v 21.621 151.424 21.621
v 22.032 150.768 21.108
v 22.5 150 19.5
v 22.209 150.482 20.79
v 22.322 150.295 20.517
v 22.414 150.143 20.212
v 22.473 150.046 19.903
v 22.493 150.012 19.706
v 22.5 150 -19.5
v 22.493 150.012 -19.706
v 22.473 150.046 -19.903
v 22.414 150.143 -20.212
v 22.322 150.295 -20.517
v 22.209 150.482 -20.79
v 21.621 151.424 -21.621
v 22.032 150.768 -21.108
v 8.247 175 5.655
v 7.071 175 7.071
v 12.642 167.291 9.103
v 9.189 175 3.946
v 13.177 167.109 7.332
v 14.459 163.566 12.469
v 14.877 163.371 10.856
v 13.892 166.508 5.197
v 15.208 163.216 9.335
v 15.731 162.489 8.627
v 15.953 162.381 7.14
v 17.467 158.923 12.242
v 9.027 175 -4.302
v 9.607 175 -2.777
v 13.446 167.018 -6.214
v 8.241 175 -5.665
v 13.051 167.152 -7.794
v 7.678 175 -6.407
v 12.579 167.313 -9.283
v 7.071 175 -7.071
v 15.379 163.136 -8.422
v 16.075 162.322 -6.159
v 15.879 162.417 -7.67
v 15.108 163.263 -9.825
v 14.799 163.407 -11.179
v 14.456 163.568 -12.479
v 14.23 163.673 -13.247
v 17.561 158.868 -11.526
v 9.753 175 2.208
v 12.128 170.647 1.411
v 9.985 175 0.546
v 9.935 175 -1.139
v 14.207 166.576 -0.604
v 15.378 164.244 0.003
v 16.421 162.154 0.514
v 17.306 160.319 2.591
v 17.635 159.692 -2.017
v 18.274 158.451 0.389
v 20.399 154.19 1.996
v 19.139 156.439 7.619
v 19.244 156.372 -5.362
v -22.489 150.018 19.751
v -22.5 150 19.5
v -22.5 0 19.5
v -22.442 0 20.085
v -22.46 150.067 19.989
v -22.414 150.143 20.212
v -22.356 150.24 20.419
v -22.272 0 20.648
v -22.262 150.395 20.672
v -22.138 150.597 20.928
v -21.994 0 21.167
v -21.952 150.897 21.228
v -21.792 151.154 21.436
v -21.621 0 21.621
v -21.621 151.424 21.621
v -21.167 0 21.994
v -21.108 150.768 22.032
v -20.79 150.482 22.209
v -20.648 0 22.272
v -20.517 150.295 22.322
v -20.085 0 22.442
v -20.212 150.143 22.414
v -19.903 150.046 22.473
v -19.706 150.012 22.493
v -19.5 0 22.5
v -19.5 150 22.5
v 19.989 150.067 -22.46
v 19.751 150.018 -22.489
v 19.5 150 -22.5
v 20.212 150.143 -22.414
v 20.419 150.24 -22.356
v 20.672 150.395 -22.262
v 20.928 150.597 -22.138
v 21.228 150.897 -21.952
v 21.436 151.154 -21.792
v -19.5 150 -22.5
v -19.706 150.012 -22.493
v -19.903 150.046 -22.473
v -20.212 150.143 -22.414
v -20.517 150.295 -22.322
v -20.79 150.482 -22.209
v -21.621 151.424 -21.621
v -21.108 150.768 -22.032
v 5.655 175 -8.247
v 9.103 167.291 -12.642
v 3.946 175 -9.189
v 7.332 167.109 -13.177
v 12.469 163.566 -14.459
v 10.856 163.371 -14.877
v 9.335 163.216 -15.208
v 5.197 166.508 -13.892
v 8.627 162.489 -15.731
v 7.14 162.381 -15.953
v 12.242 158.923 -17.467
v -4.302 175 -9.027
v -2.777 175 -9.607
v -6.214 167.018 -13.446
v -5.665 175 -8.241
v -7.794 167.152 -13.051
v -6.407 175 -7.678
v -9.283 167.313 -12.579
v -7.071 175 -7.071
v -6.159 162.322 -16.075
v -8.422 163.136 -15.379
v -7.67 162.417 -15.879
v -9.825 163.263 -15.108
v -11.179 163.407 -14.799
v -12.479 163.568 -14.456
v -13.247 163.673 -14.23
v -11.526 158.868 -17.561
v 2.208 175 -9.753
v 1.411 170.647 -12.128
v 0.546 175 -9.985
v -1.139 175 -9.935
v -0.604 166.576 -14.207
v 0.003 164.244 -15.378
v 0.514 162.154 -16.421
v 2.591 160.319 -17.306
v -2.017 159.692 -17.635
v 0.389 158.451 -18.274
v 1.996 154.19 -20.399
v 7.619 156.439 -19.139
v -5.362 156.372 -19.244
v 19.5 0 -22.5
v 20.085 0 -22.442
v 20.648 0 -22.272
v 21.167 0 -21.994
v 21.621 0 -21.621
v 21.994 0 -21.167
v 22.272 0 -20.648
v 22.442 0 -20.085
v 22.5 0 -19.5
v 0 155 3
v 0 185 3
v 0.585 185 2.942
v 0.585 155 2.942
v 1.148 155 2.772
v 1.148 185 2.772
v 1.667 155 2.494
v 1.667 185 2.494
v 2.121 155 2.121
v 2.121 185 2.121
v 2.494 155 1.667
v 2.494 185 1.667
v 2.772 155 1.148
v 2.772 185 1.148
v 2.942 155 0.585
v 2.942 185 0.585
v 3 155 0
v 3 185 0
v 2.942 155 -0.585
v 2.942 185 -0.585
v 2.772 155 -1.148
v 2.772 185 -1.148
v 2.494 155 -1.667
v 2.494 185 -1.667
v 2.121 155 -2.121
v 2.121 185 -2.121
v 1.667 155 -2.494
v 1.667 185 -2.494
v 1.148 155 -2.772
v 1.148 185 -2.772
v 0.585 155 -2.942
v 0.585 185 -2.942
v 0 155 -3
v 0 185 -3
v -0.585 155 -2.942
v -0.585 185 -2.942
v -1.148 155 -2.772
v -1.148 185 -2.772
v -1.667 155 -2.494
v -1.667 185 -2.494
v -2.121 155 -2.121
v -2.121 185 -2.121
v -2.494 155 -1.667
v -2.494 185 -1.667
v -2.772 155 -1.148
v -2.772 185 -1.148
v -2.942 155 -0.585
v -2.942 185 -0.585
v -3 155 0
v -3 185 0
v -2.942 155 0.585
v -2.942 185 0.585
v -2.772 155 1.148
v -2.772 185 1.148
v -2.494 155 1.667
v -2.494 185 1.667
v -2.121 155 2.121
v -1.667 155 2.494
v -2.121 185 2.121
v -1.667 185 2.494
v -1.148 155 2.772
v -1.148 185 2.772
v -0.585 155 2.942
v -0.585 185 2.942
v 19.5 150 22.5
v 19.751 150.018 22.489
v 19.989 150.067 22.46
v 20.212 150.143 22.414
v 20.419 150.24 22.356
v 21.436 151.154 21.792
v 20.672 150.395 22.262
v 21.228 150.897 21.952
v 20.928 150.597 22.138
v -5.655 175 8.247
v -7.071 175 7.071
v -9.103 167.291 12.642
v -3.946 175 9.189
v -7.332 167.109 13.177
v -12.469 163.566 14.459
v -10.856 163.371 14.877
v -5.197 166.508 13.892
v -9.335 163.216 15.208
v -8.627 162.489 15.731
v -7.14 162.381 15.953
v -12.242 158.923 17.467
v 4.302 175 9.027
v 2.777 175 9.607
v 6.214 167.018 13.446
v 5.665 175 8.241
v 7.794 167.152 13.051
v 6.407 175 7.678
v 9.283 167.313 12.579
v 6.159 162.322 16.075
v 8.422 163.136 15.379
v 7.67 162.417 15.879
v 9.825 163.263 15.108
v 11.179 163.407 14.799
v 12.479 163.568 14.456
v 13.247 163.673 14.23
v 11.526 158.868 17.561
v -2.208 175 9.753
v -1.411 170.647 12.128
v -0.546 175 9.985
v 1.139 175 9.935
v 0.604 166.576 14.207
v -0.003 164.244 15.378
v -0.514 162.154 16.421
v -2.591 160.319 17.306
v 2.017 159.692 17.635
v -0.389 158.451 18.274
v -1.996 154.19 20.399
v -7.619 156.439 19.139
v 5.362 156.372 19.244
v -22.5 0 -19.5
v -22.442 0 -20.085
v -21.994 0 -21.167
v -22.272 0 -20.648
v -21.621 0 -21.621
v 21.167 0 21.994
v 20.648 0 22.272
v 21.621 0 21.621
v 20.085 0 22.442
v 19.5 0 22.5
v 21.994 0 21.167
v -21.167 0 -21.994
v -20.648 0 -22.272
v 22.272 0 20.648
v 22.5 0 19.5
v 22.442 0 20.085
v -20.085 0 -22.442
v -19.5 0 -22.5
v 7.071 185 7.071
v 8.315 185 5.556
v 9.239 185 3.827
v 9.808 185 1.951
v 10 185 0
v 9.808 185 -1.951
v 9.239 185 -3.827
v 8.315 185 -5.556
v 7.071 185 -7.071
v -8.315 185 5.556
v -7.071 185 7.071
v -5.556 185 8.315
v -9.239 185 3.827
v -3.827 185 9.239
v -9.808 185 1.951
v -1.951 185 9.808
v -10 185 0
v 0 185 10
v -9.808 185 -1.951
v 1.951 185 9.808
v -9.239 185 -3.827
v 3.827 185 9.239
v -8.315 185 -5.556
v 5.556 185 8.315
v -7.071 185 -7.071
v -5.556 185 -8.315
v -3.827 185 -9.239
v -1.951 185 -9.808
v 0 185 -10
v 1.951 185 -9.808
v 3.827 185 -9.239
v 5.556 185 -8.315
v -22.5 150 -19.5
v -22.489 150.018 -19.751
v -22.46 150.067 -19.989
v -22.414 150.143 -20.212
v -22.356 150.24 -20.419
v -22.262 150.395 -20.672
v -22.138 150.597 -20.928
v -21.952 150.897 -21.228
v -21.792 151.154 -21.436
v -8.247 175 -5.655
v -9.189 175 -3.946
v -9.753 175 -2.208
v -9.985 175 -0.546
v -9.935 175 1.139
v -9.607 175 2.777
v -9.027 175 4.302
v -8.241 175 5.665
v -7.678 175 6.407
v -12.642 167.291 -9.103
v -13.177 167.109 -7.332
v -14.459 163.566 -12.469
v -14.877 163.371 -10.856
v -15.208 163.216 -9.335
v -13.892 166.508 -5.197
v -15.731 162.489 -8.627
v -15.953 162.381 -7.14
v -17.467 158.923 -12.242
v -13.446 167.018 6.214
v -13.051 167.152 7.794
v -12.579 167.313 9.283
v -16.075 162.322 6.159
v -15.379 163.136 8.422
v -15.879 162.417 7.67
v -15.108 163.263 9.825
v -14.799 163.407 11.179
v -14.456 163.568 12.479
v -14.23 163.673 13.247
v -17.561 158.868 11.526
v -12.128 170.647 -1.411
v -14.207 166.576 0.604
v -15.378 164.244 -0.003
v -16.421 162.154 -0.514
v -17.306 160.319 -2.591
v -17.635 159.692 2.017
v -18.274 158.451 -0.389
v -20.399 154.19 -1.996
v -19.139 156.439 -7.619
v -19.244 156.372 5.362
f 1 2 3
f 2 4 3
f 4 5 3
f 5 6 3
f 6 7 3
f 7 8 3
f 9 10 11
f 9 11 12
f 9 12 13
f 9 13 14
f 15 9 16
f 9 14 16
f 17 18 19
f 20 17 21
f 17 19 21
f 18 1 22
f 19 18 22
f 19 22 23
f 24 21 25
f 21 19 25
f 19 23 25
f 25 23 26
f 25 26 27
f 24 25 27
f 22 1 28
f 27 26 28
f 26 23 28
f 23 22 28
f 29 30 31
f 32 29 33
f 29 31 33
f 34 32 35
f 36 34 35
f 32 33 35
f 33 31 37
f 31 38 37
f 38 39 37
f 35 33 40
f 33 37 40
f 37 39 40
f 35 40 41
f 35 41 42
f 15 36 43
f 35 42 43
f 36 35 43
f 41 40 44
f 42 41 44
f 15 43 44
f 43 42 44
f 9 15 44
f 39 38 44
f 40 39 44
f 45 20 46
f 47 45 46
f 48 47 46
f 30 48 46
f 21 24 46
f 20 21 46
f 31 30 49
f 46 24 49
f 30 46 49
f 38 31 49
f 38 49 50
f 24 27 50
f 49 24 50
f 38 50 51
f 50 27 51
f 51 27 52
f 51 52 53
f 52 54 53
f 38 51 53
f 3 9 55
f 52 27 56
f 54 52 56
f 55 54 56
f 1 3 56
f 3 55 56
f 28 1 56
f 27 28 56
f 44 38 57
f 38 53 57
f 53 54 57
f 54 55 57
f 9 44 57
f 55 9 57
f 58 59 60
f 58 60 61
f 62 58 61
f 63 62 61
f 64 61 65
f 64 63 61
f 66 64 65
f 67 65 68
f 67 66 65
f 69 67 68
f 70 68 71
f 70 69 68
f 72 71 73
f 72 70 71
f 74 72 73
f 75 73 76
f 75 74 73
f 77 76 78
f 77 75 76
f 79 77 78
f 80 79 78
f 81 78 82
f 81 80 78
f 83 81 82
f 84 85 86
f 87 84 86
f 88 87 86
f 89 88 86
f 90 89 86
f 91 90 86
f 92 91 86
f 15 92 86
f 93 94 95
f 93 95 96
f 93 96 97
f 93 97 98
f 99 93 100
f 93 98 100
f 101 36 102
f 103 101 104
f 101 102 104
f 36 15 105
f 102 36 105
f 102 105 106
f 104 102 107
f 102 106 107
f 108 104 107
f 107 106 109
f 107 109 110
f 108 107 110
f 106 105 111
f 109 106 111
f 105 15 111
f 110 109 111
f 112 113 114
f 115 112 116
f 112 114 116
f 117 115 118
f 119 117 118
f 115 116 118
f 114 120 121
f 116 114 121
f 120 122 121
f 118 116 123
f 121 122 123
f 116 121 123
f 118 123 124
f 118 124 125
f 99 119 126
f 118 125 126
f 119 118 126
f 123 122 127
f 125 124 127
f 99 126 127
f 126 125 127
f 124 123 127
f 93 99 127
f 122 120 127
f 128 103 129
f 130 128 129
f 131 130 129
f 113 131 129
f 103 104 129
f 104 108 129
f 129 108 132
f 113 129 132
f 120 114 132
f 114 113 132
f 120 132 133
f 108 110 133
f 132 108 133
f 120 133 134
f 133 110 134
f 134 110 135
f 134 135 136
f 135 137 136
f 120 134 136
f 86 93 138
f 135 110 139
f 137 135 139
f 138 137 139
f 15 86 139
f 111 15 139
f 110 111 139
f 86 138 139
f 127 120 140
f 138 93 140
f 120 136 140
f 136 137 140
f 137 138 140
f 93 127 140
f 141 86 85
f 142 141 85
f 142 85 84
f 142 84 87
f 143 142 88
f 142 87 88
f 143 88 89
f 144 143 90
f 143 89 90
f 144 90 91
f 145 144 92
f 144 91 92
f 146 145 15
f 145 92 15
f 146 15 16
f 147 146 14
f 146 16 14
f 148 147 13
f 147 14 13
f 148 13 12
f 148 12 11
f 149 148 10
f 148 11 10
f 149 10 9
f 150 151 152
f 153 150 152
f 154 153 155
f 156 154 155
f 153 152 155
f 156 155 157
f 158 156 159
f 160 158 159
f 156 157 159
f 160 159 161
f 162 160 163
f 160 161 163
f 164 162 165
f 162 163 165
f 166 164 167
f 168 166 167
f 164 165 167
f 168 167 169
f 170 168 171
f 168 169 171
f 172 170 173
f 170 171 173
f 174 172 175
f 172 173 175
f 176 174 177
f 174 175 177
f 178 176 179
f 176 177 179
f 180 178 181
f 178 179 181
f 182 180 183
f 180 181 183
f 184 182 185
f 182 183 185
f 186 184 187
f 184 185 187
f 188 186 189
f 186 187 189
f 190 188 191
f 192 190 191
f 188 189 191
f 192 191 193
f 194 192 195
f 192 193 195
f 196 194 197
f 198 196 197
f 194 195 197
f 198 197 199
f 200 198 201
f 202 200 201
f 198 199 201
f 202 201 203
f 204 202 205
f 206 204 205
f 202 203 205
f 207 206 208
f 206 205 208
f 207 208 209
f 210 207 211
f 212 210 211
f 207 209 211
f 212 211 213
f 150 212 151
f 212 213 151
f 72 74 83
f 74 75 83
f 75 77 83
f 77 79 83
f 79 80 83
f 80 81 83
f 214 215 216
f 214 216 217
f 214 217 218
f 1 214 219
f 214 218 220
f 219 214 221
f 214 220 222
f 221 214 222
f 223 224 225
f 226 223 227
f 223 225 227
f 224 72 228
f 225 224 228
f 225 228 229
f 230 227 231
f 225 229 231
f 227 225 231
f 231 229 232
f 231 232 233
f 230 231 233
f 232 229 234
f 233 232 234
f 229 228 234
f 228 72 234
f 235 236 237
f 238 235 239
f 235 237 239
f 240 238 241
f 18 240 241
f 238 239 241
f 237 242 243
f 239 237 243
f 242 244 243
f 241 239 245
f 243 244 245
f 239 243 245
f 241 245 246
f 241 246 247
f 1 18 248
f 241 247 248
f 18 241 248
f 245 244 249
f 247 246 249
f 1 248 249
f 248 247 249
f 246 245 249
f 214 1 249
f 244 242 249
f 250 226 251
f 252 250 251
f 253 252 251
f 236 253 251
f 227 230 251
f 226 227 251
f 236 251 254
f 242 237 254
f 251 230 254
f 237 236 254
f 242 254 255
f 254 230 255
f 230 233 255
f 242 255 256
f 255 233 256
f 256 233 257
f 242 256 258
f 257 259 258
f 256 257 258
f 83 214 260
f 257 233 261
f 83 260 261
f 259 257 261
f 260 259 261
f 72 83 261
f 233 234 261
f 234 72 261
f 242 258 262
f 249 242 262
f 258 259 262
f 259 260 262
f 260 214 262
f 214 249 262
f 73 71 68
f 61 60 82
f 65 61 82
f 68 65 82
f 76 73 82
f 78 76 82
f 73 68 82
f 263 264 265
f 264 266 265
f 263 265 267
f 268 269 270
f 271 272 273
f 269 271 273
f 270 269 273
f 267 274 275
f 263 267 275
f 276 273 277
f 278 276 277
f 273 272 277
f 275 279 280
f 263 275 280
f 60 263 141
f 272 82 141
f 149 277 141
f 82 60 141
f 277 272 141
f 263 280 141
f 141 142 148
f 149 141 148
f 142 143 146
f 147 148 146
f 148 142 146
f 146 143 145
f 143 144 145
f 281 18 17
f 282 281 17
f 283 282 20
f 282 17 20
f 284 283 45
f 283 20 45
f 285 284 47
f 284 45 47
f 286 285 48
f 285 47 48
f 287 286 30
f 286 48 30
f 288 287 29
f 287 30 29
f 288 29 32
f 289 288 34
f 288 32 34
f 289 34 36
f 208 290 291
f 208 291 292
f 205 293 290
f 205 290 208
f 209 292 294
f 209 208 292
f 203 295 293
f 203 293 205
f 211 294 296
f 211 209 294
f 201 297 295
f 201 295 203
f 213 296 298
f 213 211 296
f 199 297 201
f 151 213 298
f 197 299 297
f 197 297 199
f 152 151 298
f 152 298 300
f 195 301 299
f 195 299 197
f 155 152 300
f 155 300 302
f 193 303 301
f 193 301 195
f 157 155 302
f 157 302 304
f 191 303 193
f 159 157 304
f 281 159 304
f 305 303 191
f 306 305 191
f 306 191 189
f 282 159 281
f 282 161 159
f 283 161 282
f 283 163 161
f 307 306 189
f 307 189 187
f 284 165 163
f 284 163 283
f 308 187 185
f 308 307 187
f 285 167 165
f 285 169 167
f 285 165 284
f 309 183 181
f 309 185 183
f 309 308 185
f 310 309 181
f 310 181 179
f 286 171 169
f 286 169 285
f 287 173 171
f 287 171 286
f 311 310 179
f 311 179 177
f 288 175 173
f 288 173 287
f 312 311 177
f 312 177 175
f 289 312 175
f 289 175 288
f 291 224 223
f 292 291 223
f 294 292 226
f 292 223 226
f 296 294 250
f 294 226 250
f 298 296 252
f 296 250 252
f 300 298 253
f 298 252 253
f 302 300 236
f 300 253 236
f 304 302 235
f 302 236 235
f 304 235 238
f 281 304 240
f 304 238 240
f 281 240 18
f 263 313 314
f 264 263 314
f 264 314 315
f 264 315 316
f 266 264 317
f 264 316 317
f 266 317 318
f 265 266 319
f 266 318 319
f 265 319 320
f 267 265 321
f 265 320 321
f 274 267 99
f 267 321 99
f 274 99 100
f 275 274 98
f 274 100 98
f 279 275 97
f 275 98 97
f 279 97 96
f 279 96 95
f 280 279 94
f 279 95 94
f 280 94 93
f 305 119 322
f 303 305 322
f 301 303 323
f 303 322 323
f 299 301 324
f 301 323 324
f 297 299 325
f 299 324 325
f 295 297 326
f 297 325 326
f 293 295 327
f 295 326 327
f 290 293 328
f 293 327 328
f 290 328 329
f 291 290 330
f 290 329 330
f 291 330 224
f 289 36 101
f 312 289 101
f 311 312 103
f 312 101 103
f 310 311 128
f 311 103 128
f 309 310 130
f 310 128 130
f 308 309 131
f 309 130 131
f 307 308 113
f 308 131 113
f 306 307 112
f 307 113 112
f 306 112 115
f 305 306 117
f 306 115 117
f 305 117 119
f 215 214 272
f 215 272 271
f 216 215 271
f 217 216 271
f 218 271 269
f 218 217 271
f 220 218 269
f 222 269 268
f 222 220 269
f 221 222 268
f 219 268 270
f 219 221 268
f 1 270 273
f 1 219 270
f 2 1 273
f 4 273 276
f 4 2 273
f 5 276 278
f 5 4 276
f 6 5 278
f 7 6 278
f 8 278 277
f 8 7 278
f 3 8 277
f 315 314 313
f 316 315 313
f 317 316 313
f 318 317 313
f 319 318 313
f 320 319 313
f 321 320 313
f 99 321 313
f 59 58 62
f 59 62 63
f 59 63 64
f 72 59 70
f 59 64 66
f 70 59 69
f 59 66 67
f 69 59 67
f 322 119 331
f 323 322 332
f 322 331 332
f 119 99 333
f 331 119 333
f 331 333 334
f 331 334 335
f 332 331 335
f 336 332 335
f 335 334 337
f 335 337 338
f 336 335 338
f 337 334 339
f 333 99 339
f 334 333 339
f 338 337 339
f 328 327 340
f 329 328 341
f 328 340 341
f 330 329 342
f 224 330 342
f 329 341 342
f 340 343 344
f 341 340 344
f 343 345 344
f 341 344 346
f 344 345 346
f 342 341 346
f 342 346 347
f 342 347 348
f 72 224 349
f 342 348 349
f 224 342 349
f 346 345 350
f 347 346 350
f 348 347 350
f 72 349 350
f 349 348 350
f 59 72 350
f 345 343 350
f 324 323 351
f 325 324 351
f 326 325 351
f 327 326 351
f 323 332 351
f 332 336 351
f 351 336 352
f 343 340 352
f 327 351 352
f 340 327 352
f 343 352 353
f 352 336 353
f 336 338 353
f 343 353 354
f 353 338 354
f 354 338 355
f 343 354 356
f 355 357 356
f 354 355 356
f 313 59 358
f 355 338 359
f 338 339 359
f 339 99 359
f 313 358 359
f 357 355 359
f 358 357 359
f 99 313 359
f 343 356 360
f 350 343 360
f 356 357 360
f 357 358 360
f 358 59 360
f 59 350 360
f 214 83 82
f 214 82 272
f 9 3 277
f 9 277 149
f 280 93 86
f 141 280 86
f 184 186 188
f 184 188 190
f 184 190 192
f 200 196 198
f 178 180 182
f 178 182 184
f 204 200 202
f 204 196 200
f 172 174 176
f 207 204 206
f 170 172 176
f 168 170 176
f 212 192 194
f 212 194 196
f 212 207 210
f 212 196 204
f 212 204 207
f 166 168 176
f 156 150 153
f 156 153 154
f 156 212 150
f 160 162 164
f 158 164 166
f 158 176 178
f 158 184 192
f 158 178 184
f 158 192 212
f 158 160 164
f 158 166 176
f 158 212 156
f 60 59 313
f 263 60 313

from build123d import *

# Parameters (mm, degrees)
SKETCH_1_W          = 45
SKETCH_1_H          = 45
EXTRUDE_1_DEPTH     = 150
SKETCH_2_W          = 45
SKETCH_2_H          = 45
EXTRUDE_2_DEPTH     = 10
SKETCH_5_R          = 3
CUT_EXTRUDE_1_DEPTH = 30
FILLET_1_R          = 3


with BuildPart() as part:
    # 草图1 → 凸台-拉伸1 (new body)
    with BuildSketch(Plane(origin=(0, 0, 0), x_dir=(1, 0, 0), z_dir=(0, 1, 0))):
        Rectangle(SKETCH_1_W, SKETCH_1_H)
    extrude(amount=EXTRUDE_1_DEPTH)

    # 草图3 for 放样1 → 放样1 section 0
    with BuildSketch(Plane(origin=(0, 175, 0), x_dir=(1, 0, 0), z_dir=(0, 1, 0))):
        with BuildLine():
            # circular arc as an exact rational Bezier (weights 1, cos(half-angle), 1)
            Bezier((7.071067812, -7.071067812), (14.142135623, 0), (7.071067812, 7.071067812), weights=[1, 0.707106781, 1])
            Bezier((7.071067812, 7.071067812), (0, 14.142135623), (-7.071067812, 7.071067812), weights=[1, 0.707106781, 1])
            Bezier((-7.071067812, 7.071067812), (-14.142135623, 0), (-7.071067812, -7.071067812), weights=[1, 0.707106781, 1])
            Bezier((-7.071067812, -7.071067812), (0, -14.142135623), (7.071067812, -7.071067812), weights=[1, 0.707106781, 1])
        make_face()
    # 草图2 → 放样1 section 1
    with BuildSketch(Plane(origin=(0, 150, 0), x_dir=(1, 0, 0), z_dir=(0, 1, 0))):
        Rectangle(SKETCH_2_W, SKETCH_2_H)
    loft()

    # 草图4 → 凸台-拉伸2 (add)
    with BuildSketch(Plane(origin=(0, 175, 0), x_dir=(1, 0, 0), z_dir=(0, 1, 0))):
        with BuildLine():
            ThreePointArc((-7.071067812, 7.071067812), (-10, 0), (-7.071067812, -7.071067812))
            ThreePointArc((-7.071067812, -7.071067812), (0, -10), (7.071067812, -7.071067812))
            ThreePointArc((7.071067812, -7.071067812), (10, 0), (7.071067812, 7.071067812))
            ThreePointArc((7.071067812, 7.071067812), (0, 10), (-7.071067812, 7.071067812))
        make_face()
    extrude(amount=EXTRUDE_2_DEPTH)

    # 草图5 → 切除-拉伸1 (cut)
    with BuildSketch(Plane(origin=(0, 185, 0), x_dir=(1, 0, 0), z_dir=(0, 1, 0))):
        with Locations(Location((0, 0, 0), (0, 0, 270))):
            Circle(SKETCH_5_R)
    extrude(amount=-CUT_EXTRUDE_1_DEPTH, mode=Mode.SUBTRACT)

    # 圆角1
    fillet_1_edges = [part.edges().sort_by_distance(p)[0] for p in [
        (22.5, 75, -22.5),
        (22.5, 75, 22.5),
        (-22.5, 75, -22.5),
        (-22.5, 75, 22.5),
    ]]
    fillet(fillet_1_edges, radius=FILLET_1_R)


solid = part.part
